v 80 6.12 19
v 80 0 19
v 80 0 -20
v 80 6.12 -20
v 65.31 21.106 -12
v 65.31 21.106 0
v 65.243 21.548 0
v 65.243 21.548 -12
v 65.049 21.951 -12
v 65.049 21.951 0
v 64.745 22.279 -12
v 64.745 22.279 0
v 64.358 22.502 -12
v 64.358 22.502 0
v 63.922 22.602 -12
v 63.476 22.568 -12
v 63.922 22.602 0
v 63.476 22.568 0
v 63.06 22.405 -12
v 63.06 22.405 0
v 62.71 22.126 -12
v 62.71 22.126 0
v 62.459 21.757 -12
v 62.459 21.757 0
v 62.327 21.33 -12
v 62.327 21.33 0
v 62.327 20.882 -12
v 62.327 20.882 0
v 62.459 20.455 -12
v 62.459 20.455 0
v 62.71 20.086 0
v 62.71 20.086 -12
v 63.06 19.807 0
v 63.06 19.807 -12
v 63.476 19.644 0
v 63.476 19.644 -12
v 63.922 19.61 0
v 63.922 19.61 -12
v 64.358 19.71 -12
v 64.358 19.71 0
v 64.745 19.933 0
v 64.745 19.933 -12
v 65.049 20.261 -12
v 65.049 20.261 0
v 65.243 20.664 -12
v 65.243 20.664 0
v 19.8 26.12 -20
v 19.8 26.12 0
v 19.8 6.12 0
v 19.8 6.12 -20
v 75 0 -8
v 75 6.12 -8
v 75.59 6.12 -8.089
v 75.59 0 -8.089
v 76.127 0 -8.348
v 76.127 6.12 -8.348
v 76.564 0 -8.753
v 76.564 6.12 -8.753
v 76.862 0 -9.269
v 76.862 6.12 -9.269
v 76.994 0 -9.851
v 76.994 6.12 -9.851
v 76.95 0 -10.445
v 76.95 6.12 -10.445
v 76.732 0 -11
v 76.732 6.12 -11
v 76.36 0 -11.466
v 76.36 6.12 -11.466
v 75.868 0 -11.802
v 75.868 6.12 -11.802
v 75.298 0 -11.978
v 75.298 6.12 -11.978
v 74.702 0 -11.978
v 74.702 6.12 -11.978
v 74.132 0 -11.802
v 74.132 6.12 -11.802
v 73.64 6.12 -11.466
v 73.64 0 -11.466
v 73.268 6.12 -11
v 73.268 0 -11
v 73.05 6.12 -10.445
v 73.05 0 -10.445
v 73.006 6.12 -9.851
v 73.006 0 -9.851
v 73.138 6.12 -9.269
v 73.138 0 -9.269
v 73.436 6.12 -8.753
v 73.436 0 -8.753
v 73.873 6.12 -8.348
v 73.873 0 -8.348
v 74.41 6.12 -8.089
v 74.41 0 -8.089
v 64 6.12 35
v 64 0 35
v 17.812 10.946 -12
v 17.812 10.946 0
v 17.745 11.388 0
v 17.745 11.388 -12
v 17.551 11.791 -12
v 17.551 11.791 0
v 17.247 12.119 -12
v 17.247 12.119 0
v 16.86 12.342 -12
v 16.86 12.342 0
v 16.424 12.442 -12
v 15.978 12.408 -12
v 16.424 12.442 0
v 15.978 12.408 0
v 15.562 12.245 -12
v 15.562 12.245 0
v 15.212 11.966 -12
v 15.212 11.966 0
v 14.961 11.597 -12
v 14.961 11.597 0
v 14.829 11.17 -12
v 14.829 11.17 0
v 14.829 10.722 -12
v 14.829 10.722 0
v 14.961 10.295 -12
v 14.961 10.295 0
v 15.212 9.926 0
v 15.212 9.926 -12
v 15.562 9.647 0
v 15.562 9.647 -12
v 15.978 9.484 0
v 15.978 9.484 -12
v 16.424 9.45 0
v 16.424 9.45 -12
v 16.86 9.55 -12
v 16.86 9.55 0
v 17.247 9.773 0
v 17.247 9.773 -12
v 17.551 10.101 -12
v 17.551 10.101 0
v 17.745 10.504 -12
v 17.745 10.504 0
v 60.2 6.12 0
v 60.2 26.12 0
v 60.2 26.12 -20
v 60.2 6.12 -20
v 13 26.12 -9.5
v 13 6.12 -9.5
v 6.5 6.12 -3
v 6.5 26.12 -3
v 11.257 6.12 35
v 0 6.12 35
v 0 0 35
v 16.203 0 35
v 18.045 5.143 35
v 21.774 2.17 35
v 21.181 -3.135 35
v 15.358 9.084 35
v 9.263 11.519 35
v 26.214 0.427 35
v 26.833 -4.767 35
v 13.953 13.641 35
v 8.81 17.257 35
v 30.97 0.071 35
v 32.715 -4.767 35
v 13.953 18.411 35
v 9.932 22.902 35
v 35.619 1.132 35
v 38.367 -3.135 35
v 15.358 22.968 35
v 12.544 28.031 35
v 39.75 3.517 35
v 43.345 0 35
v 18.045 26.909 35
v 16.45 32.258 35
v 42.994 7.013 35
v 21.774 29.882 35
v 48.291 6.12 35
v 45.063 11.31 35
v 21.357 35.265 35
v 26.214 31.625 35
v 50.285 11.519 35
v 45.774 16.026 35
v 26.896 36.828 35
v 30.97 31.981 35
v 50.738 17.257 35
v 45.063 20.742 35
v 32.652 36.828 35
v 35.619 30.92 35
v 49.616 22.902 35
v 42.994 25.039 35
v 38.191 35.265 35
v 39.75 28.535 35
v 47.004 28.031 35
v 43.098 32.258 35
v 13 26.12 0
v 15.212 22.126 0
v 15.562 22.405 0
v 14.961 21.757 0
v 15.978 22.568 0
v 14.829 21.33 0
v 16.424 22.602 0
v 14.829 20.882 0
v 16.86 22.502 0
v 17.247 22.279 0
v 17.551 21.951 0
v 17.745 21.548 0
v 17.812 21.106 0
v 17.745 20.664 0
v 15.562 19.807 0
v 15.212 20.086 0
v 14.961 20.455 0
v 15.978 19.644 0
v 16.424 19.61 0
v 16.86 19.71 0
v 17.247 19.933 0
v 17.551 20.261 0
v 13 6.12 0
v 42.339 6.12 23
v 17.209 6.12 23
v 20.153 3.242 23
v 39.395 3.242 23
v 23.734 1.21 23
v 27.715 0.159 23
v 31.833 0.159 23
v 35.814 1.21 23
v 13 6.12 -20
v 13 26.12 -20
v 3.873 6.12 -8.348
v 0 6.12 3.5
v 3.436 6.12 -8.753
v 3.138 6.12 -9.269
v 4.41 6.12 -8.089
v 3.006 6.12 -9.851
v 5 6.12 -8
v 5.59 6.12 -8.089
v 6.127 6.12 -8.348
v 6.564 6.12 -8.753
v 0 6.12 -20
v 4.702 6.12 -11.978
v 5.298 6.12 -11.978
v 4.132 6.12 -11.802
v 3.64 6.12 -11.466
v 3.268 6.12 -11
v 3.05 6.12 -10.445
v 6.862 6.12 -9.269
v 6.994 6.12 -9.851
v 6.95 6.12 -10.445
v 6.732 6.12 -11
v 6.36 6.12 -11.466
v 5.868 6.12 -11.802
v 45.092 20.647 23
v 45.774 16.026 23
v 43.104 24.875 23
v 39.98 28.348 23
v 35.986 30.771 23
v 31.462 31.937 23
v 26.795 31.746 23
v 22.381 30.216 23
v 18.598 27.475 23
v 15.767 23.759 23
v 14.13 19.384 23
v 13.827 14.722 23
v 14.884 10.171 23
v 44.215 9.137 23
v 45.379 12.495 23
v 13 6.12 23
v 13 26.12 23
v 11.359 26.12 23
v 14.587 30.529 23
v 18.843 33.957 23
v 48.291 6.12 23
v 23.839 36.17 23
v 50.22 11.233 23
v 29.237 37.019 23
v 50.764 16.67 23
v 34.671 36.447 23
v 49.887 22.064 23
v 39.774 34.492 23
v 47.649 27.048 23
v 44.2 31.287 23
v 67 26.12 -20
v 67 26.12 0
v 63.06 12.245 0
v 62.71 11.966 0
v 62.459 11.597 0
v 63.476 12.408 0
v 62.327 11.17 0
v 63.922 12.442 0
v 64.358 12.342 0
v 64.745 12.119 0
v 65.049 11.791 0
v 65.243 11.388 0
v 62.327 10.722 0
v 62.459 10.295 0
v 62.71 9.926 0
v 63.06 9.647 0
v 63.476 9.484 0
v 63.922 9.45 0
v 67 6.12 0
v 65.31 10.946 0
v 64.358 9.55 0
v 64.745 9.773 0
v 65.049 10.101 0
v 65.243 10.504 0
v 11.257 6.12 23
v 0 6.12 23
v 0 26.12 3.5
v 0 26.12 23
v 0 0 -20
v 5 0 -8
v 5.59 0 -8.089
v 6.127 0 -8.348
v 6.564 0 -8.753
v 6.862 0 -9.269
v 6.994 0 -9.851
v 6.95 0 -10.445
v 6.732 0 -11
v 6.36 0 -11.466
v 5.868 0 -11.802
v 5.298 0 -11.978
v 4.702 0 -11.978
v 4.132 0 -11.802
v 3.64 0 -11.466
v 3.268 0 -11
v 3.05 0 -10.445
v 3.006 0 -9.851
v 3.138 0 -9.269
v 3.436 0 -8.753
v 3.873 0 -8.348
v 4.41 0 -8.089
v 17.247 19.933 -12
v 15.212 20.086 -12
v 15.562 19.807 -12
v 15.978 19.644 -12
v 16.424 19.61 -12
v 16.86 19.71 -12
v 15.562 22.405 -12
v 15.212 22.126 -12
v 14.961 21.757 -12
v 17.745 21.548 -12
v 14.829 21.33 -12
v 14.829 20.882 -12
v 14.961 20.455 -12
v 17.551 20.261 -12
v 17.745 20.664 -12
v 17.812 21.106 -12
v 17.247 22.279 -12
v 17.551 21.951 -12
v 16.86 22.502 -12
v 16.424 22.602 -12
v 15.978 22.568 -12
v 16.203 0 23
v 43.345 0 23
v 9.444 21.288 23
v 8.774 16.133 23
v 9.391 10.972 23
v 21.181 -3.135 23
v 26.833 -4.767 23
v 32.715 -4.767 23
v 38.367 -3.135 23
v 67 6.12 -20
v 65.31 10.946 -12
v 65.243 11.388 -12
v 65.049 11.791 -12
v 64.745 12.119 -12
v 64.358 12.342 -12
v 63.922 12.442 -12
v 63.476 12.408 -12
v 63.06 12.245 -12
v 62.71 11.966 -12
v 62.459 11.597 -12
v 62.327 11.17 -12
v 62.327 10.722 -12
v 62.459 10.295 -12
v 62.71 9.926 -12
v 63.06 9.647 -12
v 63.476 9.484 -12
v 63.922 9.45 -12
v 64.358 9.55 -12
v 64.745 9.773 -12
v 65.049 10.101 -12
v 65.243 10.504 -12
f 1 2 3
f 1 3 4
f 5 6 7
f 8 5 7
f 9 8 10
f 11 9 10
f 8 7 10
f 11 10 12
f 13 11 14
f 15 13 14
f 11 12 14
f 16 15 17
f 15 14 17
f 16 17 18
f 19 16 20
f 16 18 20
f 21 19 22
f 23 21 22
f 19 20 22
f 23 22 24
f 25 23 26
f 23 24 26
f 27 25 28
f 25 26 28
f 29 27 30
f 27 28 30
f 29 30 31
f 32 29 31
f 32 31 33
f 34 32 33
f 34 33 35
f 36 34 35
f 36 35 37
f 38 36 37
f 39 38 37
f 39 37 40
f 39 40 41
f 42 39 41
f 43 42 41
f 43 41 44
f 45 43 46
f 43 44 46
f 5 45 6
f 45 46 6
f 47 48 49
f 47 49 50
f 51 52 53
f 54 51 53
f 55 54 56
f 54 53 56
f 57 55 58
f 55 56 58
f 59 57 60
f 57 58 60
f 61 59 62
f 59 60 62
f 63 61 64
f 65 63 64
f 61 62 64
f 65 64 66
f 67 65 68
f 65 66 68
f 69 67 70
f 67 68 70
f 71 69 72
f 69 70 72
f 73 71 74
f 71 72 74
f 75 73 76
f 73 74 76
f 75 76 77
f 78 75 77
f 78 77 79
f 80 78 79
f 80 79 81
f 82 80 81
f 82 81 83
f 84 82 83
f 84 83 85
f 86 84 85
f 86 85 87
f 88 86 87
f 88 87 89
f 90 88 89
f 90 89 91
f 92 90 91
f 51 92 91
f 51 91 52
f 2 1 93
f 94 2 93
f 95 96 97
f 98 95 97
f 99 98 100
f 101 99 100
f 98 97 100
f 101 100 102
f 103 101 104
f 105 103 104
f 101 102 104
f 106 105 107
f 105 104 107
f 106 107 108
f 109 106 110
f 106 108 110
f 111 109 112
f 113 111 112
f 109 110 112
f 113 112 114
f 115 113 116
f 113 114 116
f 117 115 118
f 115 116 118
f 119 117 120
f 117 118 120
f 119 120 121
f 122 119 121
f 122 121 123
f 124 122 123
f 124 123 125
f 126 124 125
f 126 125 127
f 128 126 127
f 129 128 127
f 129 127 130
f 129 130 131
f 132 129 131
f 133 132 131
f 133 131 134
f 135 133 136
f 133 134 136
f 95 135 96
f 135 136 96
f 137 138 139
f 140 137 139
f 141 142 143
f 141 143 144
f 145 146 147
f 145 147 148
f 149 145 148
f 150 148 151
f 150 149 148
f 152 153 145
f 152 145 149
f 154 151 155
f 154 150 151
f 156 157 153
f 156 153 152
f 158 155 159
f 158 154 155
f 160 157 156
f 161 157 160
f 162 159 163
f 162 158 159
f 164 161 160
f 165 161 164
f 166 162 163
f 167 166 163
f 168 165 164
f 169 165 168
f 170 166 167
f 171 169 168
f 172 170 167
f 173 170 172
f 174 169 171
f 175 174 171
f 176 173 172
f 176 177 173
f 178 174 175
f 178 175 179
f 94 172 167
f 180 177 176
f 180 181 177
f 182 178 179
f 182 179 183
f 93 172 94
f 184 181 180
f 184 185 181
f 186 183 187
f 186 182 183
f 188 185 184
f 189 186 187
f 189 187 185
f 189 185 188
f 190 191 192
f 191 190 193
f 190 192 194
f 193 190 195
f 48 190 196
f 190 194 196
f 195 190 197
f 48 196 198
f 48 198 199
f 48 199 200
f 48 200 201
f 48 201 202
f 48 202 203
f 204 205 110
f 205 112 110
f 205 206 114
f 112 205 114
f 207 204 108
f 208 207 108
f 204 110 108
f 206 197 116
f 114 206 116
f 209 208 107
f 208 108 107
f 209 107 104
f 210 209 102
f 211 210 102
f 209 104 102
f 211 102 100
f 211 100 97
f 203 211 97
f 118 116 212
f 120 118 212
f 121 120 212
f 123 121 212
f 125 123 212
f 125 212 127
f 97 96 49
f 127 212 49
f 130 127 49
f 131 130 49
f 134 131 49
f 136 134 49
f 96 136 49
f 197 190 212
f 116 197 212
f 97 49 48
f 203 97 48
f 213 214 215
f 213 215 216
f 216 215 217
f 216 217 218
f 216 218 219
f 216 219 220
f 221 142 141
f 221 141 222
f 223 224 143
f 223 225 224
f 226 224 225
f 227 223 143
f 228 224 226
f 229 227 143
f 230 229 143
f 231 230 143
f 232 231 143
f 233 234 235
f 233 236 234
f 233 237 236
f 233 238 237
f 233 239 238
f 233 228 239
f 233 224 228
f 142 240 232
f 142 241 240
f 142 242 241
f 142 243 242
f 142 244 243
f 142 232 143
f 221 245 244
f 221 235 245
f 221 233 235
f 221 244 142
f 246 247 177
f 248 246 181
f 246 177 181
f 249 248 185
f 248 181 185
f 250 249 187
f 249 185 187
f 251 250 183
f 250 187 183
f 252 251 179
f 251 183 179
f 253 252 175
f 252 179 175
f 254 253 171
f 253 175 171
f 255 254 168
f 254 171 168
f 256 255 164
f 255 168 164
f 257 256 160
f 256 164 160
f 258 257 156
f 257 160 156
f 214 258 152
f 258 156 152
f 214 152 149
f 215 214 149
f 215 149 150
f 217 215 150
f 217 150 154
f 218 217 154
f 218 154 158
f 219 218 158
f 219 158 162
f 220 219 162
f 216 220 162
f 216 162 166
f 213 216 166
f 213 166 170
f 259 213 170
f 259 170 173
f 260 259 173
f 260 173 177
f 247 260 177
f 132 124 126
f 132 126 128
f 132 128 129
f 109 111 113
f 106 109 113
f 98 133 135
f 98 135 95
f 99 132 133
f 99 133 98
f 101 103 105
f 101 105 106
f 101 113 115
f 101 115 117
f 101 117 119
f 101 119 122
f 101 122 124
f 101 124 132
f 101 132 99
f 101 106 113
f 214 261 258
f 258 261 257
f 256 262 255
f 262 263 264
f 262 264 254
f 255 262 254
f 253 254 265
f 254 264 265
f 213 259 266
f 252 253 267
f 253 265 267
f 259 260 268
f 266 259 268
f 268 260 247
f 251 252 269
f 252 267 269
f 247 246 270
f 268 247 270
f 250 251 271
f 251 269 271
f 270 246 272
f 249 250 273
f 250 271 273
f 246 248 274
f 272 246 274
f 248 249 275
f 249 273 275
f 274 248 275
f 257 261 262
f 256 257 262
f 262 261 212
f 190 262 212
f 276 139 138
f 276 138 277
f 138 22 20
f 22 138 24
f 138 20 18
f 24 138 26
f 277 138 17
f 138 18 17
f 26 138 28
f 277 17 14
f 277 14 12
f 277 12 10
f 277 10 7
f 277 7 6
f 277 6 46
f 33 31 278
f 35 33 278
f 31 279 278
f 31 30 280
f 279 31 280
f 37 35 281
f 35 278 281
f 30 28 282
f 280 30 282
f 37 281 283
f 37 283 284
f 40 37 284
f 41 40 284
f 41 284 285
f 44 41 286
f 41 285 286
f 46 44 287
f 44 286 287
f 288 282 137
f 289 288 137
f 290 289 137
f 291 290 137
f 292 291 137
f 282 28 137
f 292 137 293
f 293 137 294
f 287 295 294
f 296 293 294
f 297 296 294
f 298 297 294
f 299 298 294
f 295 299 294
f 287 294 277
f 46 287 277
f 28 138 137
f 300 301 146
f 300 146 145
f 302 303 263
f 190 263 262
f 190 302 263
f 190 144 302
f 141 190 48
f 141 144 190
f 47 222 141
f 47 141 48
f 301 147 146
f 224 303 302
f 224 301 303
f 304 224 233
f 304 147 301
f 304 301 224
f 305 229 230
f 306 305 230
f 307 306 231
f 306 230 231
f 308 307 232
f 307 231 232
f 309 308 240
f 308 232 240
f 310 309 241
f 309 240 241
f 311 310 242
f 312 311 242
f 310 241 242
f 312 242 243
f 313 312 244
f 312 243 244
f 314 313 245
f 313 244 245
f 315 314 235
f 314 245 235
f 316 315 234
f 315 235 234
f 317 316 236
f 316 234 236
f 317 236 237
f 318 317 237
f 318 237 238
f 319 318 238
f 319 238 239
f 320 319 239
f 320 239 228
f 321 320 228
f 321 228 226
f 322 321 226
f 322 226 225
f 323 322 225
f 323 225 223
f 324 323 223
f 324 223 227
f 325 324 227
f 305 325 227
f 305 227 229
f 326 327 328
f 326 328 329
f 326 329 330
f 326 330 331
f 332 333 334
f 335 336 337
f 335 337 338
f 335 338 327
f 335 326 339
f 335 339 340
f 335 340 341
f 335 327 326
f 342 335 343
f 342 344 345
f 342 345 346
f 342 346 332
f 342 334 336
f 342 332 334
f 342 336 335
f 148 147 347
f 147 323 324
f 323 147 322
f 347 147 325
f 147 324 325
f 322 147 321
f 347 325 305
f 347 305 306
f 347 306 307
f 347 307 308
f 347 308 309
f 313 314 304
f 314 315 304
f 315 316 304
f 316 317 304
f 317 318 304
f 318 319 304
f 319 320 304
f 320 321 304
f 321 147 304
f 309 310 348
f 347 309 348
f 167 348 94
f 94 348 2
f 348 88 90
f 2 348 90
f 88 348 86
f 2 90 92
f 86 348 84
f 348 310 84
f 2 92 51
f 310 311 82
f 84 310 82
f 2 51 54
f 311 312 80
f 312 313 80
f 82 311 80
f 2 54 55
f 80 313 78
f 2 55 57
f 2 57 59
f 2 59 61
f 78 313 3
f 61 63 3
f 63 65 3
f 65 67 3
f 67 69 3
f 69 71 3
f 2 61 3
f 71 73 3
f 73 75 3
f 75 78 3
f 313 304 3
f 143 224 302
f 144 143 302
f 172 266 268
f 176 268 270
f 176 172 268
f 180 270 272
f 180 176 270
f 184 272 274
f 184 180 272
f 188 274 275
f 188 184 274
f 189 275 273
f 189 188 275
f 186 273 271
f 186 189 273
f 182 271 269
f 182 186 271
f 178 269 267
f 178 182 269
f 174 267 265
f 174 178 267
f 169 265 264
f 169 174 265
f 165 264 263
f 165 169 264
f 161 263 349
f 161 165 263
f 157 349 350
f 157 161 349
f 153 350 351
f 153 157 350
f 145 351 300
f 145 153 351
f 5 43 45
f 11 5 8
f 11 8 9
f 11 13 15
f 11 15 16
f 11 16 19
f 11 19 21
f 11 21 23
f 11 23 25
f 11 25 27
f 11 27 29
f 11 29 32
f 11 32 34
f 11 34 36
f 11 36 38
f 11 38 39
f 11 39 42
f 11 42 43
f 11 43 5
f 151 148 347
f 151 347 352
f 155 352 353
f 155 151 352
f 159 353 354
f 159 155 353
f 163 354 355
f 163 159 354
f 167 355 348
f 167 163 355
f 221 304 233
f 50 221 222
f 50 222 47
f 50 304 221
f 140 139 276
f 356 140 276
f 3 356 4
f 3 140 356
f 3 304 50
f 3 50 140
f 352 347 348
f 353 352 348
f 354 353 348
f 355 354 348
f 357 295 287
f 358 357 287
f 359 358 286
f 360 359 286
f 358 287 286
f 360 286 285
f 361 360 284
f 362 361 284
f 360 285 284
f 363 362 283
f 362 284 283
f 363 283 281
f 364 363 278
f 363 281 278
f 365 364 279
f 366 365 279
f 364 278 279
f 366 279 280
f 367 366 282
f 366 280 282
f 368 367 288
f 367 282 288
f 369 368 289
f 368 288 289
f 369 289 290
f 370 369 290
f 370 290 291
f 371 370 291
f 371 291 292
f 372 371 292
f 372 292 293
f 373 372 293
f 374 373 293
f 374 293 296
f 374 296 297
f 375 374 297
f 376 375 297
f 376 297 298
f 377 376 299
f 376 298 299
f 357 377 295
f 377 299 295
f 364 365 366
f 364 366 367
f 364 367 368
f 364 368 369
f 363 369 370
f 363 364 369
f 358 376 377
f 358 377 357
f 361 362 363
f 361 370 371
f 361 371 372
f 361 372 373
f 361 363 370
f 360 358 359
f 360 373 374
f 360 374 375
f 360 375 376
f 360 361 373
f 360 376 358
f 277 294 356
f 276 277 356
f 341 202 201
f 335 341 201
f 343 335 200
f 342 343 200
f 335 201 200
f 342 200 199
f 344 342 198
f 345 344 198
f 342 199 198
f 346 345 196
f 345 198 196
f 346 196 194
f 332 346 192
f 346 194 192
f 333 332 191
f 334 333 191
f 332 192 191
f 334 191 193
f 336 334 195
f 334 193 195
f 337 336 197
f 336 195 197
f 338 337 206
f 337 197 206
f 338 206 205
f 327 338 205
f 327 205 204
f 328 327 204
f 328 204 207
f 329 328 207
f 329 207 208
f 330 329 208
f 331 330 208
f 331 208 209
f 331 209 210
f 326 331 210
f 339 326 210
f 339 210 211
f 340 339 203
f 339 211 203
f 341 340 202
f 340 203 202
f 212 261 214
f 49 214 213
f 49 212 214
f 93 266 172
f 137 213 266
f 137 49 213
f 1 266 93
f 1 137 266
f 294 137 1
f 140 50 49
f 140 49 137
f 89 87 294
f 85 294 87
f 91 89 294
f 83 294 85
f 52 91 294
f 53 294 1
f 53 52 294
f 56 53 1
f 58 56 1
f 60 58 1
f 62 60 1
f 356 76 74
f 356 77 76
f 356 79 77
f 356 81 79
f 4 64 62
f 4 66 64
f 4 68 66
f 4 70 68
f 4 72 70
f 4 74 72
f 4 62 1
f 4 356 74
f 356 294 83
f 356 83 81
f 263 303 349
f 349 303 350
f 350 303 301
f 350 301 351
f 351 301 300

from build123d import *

# Parameters (mm, degrees)
SKETCH1_W           = 80
SKETCH1_H           = 20
BOSS_EXTRUDE1_DEPTH = 6.12
SKETCH14_R          = 2
CUT_EXTRUDE7_DEPTH  = 22.92
SKETCH2_W           = 7
SKETCH2_H           = 20
BOSS_EXTRUDE2_DEPTH = 20
SKETCH3_W           = 80
SKETCH3_H           = 6.12
BOSS_EXTRUDE3_DEPTH = 35
SKETCH5_R           = 21
BOSS_EXTRUDE4_DEPTH = 12
SKETCH4_R           = 16
CUT_EXTRUDE1_DEPTH  = 12
SKETCH7_R           = 1.5
CUT_EXTRUDE2_DEPTH  = 12
CUT_EXTRUDE4_DEPTH  = 10
SKETCH15_W          = 40.4
SKETCH15_H          = 20
CUT_EXTRUDE8_DEPTH  = 20
SKETCH16_W          = 13
SKETCH16_H          = 26
BOSS_EXTRUDE6_DEPTH = 20
CHAMFER1_SIZE       = 6.5


with BuildPart() as part:
    # Sketch1 → Boss-Extrude1 (new body)
    with BuildSketch(Plane(origin=(0, 0, 0), x_dir=(1, 0, 0), z_dir=(0, 1, 0))):
        with Locations((40, 10)):
            Rectangle(SKETCH1_W, SKETCH1_H)
    extrude(amount=BOSS_EXTRUDE1_DEPTH)

    # Sketch14 → Cut-Extrude7 (cut)
    with BuildSketch(Plane(origin=(0, 6.12, 0), x_dir=(1, 0, 0), z_dir=(0, 1, 0))):
        with Locations(Location((75, 10, 0), (0, 0, 270))):
            Circle(SKETCH14_R)
        with Locations(Location((5, 10, 0), (0, 0, 270))):
            Circle(SKETCH14_R)
    extrude(amount=-CUT_EXTRUDE7_DEPTH, mode=Mode.SUBTRACT)

    # Sketch2 → Boss-Extrude2 (add)
    with BuildSketch(Plane(origin=(0, 6.12, 0), x_dir=(1, 0, 0), z_dir=(0, 1, 0))):
        with Locations((16.5, 10)):
            Rectangle(SKETCH2_W, SKETCH2_H)
        with Locations((63.5, 10)):
            Rectangle(SKETCH2_W, SKETCH2_H)
    extrude(amount=BOSS_EXTRUDE2_DEPTH)

    # Sketch3 → Boss-Extrude3 (add)
    with BuildSketch(Plane.XY):
        with Locations((40, 3.06)):
            Rectangle(SKETCH3_W, SKETCH3_H)
    extrude(amount=BOSS_EXTRUDE3_DEPTH)

    # Sketch5 → Boss-Extrude4 (add)
    with BuildSketch(Plane.XY.offset(35)):
        with Locations((29.774, 16.026)):
            Circle(SKETCH5_R)
    extrude(amount=-BOSS_EXTRUDE4_DEPTH)

    # Sketch4 → Cut-Extrude1 (cut)
    with BuildSketch(Plane.XY.offset(35)):
        with Locations((29.774, 16.026)):
            Circle(SKETCH4_R)
    extrude(amount=-CUT_EXTRUDE1_DEPTH, mode=Mode.SUBTRACT)

    # Sketch7 → Cut-Extrude2 (cut)
    with BuildSketch(Plane.XY):
        with Locations((16.312, 21.106)):
            Circle(SKETCH7_R)
        with Locations((16.312, 10.946)):
            Circle(SKETCH7_R)
        with Locations((63.81, 10.946)):
            Circle(SKETCH7_R)
        with Locations((63.81, 21.106)):
            Circle(SKETCH7_R)
    extrude(amount=-CUT_EXTRUDE2_DEPTH, mode=Mode.SUBTRACT)

    # Sketch9 → Cut-Extrude4 (cut)
    with BuildSketch(Plane(origin=(0, 6.12, 0), x_dir=(1, 0, 0), z_dir=(0, 1, 0))):
        Polygon((80, -19), (64, -35), (80, -35), align=None)
    extrude(amount=-CUT_EXTRUDE4_DEPTH, mode=Mode.SUBTRACT)

    # Sketch15 → Cut-Extrude8 (cut)
    with BuildSketch(Plane(origin=(0, 26.12, 0), x_dir=(1, 0, 0), z_dir=(0, 1, 0))):
        with Locations((40, 10)):
            Rectangle(SKETCH15_W, SKETCH15_H)
    extrude(amount=-CUT_EXTRUDE8_DEPTH, mode=Mode.SUBTRACT)

    # Sketch16 → Boss-Extrude6 (add)
    with BuildSketch(Plane(origin=(0, 6.12, 0), x_dir=(1, 0, 0), z_dir=(0, 1, 0))):
        with Locations((6.5, -10)):
            Rectangle(SKETCH16_W, SKETCH16_H)
    extrude(amount=BOSS_EXTRUDE6_DEPTH)

    # Chamfer1
    chamfer1_edges = [part.edges().sort_by_distance(p)[0] for p in [
        (13, 16.12, -3),
    ]]
    chamfer(chamfer1_edges, length=CHAMFER1_SIZE)
    chamfer1_2_edges = [part.edges().sort_by_distance(p)[0] for p in [
        (0, 16.12, -3),
    ]]
    chamfer(chamfer1_2_edges, length=CHAMFER1_SIZE - 0.0001)  # a hair under: the kernel refuses the full size


solid = part.part
